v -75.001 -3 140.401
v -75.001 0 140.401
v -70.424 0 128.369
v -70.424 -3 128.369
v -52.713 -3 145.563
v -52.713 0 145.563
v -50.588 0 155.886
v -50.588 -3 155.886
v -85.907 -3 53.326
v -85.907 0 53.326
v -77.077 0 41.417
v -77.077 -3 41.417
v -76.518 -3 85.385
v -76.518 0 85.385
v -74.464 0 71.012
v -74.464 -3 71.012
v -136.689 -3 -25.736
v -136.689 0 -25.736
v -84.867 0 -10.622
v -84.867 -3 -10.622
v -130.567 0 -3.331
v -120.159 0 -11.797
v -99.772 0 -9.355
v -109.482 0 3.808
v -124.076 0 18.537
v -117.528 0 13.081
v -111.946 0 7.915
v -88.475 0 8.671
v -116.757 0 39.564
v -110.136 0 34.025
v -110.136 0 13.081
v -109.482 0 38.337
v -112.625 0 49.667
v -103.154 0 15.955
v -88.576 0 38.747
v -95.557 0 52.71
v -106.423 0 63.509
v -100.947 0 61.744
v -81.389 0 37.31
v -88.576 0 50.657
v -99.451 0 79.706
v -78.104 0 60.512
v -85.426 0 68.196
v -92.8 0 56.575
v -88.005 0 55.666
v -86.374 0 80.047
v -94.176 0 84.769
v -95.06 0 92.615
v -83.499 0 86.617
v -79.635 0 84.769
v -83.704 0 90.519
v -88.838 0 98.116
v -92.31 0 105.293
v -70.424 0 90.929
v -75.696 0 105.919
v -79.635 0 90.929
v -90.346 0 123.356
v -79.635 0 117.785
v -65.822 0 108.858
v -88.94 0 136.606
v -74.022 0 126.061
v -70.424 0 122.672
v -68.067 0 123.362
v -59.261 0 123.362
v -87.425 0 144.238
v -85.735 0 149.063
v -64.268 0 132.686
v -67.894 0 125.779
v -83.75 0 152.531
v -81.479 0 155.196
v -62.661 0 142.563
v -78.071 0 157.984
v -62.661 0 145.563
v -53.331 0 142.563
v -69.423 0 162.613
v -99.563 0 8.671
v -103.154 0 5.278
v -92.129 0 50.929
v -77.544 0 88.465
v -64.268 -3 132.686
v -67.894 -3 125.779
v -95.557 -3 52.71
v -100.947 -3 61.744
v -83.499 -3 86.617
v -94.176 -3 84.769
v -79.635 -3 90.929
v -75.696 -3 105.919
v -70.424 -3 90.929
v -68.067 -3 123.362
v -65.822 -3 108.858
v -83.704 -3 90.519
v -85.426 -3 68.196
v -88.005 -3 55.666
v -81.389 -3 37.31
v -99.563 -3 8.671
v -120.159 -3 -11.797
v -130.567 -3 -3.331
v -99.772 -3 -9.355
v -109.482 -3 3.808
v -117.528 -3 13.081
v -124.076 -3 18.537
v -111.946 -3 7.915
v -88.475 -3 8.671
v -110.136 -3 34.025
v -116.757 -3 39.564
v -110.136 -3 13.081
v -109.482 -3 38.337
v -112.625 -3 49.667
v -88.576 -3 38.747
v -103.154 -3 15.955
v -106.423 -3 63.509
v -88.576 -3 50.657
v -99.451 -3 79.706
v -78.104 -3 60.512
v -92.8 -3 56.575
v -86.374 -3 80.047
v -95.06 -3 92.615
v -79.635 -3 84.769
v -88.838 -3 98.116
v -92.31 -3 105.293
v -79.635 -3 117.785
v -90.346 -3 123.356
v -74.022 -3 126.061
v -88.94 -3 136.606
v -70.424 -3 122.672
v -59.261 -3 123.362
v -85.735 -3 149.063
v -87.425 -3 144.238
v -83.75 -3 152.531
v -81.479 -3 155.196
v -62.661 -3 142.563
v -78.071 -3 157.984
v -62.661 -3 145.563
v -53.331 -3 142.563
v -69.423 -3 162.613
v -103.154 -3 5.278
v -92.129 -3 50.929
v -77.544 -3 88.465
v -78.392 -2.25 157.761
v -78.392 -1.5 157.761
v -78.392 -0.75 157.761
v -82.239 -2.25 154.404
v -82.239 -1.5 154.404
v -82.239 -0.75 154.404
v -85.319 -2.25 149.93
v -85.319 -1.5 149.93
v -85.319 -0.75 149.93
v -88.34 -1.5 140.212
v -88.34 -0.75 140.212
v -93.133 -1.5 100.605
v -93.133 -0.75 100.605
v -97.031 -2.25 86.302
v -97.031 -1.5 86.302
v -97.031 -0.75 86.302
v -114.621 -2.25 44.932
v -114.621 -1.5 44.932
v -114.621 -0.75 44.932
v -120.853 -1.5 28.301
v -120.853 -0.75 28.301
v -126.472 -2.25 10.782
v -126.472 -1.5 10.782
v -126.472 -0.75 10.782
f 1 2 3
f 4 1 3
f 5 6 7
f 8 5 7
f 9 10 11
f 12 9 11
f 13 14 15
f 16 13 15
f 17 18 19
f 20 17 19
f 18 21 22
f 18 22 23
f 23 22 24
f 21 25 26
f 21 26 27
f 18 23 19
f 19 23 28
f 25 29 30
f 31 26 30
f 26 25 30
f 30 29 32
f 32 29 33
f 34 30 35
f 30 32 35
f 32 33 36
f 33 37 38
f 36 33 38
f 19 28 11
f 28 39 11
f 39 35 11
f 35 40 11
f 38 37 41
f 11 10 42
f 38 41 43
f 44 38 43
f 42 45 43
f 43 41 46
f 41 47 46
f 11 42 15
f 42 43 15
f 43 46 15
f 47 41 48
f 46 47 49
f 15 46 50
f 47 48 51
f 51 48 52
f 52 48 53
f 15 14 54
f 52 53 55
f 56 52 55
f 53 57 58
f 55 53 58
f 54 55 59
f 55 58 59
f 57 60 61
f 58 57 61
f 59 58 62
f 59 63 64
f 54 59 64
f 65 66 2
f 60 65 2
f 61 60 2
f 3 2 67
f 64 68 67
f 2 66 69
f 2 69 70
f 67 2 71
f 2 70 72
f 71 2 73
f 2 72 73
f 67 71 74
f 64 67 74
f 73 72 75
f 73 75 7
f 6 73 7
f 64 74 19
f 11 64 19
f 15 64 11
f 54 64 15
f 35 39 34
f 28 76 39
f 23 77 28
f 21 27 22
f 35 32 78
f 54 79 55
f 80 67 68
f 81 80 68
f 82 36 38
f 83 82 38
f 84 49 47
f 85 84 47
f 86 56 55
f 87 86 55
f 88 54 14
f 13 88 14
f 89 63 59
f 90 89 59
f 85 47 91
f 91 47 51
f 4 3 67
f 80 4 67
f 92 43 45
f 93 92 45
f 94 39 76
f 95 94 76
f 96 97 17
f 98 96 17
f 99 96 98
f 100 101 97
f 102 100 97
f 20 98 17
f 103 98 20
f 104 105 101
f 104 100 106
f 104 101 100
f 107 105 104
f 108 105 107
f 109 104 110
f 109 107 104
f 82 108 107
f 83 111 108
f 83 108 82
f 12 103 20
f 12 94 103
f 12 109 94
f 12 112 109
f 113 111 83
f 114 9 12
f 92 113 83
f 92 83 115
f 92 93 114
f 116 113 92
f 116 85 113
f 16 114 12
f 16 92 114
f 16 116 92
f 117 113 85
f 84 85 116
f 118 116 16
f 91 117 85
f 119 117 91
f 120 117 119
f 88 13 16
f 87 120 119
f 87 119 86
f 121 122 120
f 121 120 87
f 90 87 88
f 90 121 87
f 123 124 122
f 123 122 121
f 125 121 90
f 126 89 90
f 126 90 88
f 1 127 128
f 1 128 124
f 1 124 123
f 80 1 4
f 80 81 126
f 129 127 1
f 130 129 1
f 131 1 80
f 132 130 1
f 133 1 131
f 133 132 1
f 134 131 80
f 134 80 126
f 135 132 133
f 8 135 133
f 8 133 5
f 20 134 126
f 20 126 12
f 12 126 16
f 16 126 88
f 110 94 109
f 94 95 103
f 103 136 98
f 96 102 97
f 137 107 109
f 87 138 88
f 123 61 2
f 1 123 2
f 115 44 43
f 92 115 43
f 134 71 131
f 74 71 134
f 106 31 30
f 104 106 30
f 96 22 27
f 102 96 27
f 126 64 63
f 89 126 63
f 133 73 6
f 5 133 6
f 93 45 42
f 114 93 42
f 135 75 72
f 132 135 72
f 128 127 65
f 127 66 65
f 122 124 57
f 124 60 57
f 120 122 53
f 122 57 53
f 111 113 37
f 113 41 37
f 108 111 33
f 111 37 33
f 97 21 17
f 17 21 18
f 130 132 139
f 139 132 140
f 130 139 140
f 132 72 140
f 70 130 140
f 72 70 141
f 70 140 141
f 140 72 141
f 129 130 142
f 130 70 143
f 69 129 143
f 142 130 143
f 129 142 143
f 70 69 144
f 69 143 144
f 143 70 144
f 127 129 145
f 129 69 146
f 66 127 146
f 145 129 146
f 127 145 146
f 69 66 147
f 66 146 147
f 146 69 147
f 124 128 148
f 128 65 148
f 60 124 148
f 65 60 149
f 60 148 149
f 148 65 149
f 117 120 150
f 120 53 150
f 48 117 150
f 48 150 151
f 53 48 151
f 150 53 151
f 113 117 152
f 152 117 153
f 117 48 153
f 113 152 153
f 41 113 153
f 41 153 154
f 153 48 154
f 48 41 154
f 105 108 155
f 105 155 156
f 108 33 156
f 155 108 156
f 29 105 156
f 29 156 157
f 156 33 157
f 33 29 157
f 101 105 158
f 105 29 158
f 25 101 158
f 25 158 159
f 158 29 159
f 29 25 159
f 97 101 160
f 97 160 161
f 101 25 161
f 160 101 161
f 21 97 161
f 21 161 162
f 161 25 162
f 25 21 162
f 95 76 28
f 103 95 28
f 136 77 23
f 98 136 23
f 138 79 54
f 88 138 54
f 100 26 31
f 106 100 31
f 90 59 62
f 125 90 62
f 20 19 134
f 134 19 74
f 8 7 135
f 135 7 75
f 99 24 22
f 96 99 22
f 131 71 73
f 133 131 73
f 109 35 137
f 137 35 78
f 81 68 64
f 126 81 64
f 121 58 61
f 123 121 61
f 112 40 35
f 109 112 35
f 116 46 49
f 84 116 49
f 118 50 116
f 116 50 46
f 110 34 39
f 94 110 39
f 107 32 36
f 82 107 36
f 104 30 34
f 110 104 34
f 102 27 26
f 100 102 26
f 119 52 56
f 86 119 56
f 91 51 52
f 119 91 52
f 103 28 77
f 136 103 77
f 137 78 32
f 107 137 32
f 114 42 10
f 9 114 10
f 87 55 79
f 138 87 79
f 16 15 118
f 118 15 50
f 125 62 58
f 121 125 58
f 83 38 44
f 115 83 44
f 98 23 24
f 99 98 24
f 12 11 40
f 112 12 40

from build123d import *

# Parameters (mm, degrees)
F1_DEPTH = 3
F2_W     = 20
F2_H     = 3
F3_DEPTH = 25


with BuildPart() as f1:
    # F0 (on Front) → F1 (new body)
    with BuildSketch(Plane.XZ):
        with BuildLine():
            Line((-50.5878934722, 155.886335863), (-69.4227617458, 162.6129796857))
            add(Edge.make_bspline(
                [(-69.4227617458, 162.6129796857), (-75.629299587, 159.7091182866), (-91.5619099649, 152.254705948), (-88.2089050529, 96.1905885787), (-117.4769375663, 45.5756929764), (-130.0592963757, -1.1270613909), (-136.6891999726, -25.73570305)],
                knots=[0, 0, 0, 0, 0.1616006003, 0.414839878, 0.6916670986, 1, 1, 1, 1], degree=3))
            Line((-136.6891999726, -25.73570305), (-84.8672423278, -10.6217007059))
            Line((-84.8672423278, -10.6217007059), (-50.5878934722, 155.886335863))
        make_face()
        Polygon((-117.5276218915, 13.0807881749), (-110.1356736386, 13.0807881749), (-110.1356736386, 34.0246291405), (-103.1543902123, 15.9554307855), (-81.3892186621, 37.3099384404), (-99.563014685, 8.6714058077), (-88.4750997562, 8.6714058077), (-103.1543902123, 5.2781788206), (-99.7717275786, -9.3554096498), (-109.482120264, 3.8080944782), (-120.1593759541, -11.7971242303), (-111.9461054985, 7.9147315687), align=None, mode=Mode.SUBTRACT)
        Polygon((-109.482120264, 38.3365986443), (-95.5571169967, 52.7098247356), (-100.9470961058, 61.7444239131), (-92.8004325941, 56.5746129165), (-85.4258511347, 68.1955858554), (-88.0052784585, 55.6663111316), (-78.1039140189, 60.5124331585), (-85.9065243045, 53.3258201129), (-77.0772542806, 41.4165755308), (-88.5758335704, 50.6565061903), (-88.5758335704, 38.7472616083), (-92.128737954, 50.9292406958), align=None, mode=Mode.SUBTRACT)
        Polygon((-94.1762208009, 84.7693657077), (-83.7042965928, 90.5186565167), (-88.8375929558, 98.1159334577), (-79.6346020327, 90.9293194807), (-75.6963580848, 105.9185428119), (-77.5443451481, 88.4653379715), (-70.4243435526, 90.9293194807), (-76.5176849441, 85.385361085), (-74.4643650019, 71.0121354594), (-79.6346020327, 84.7693657077), (-86.3736114466, 80.0467341713), (-83.4989679048, 86.6173518396), align=None, mode=Mode.SUBTRACT)
        Polygon((-75.0010456618, 140.4010687484), (-70.4243435526, 128.3693922258), (-64.2680210063, 132.6859606004), (-67.8939366249, 125.7794474757), (-59.2607996428, 123.362169931), (-68.0666003378, 123.362169931), (-65.8219834791, 108.858497212), (-70.4243435526, 122.6715160108), (-79.6346020327, 117.7845689298), (-74.0220673384, 126.0610086418), align=None, mode=Mode.SUBTRACT)
    extrude(amount=F1_DEPTH)

    # F2 (on Front) → F3 (cut)
    with BuildSketch(Plane.XZ):
        with Locations((-52.6606052475, 144.0633237362)):
            Rectangle(F2_W, F2_H)
    extrude(amount=F3_DEPTH, mode=Mode.SUBTRACT)


solid = f1.part
